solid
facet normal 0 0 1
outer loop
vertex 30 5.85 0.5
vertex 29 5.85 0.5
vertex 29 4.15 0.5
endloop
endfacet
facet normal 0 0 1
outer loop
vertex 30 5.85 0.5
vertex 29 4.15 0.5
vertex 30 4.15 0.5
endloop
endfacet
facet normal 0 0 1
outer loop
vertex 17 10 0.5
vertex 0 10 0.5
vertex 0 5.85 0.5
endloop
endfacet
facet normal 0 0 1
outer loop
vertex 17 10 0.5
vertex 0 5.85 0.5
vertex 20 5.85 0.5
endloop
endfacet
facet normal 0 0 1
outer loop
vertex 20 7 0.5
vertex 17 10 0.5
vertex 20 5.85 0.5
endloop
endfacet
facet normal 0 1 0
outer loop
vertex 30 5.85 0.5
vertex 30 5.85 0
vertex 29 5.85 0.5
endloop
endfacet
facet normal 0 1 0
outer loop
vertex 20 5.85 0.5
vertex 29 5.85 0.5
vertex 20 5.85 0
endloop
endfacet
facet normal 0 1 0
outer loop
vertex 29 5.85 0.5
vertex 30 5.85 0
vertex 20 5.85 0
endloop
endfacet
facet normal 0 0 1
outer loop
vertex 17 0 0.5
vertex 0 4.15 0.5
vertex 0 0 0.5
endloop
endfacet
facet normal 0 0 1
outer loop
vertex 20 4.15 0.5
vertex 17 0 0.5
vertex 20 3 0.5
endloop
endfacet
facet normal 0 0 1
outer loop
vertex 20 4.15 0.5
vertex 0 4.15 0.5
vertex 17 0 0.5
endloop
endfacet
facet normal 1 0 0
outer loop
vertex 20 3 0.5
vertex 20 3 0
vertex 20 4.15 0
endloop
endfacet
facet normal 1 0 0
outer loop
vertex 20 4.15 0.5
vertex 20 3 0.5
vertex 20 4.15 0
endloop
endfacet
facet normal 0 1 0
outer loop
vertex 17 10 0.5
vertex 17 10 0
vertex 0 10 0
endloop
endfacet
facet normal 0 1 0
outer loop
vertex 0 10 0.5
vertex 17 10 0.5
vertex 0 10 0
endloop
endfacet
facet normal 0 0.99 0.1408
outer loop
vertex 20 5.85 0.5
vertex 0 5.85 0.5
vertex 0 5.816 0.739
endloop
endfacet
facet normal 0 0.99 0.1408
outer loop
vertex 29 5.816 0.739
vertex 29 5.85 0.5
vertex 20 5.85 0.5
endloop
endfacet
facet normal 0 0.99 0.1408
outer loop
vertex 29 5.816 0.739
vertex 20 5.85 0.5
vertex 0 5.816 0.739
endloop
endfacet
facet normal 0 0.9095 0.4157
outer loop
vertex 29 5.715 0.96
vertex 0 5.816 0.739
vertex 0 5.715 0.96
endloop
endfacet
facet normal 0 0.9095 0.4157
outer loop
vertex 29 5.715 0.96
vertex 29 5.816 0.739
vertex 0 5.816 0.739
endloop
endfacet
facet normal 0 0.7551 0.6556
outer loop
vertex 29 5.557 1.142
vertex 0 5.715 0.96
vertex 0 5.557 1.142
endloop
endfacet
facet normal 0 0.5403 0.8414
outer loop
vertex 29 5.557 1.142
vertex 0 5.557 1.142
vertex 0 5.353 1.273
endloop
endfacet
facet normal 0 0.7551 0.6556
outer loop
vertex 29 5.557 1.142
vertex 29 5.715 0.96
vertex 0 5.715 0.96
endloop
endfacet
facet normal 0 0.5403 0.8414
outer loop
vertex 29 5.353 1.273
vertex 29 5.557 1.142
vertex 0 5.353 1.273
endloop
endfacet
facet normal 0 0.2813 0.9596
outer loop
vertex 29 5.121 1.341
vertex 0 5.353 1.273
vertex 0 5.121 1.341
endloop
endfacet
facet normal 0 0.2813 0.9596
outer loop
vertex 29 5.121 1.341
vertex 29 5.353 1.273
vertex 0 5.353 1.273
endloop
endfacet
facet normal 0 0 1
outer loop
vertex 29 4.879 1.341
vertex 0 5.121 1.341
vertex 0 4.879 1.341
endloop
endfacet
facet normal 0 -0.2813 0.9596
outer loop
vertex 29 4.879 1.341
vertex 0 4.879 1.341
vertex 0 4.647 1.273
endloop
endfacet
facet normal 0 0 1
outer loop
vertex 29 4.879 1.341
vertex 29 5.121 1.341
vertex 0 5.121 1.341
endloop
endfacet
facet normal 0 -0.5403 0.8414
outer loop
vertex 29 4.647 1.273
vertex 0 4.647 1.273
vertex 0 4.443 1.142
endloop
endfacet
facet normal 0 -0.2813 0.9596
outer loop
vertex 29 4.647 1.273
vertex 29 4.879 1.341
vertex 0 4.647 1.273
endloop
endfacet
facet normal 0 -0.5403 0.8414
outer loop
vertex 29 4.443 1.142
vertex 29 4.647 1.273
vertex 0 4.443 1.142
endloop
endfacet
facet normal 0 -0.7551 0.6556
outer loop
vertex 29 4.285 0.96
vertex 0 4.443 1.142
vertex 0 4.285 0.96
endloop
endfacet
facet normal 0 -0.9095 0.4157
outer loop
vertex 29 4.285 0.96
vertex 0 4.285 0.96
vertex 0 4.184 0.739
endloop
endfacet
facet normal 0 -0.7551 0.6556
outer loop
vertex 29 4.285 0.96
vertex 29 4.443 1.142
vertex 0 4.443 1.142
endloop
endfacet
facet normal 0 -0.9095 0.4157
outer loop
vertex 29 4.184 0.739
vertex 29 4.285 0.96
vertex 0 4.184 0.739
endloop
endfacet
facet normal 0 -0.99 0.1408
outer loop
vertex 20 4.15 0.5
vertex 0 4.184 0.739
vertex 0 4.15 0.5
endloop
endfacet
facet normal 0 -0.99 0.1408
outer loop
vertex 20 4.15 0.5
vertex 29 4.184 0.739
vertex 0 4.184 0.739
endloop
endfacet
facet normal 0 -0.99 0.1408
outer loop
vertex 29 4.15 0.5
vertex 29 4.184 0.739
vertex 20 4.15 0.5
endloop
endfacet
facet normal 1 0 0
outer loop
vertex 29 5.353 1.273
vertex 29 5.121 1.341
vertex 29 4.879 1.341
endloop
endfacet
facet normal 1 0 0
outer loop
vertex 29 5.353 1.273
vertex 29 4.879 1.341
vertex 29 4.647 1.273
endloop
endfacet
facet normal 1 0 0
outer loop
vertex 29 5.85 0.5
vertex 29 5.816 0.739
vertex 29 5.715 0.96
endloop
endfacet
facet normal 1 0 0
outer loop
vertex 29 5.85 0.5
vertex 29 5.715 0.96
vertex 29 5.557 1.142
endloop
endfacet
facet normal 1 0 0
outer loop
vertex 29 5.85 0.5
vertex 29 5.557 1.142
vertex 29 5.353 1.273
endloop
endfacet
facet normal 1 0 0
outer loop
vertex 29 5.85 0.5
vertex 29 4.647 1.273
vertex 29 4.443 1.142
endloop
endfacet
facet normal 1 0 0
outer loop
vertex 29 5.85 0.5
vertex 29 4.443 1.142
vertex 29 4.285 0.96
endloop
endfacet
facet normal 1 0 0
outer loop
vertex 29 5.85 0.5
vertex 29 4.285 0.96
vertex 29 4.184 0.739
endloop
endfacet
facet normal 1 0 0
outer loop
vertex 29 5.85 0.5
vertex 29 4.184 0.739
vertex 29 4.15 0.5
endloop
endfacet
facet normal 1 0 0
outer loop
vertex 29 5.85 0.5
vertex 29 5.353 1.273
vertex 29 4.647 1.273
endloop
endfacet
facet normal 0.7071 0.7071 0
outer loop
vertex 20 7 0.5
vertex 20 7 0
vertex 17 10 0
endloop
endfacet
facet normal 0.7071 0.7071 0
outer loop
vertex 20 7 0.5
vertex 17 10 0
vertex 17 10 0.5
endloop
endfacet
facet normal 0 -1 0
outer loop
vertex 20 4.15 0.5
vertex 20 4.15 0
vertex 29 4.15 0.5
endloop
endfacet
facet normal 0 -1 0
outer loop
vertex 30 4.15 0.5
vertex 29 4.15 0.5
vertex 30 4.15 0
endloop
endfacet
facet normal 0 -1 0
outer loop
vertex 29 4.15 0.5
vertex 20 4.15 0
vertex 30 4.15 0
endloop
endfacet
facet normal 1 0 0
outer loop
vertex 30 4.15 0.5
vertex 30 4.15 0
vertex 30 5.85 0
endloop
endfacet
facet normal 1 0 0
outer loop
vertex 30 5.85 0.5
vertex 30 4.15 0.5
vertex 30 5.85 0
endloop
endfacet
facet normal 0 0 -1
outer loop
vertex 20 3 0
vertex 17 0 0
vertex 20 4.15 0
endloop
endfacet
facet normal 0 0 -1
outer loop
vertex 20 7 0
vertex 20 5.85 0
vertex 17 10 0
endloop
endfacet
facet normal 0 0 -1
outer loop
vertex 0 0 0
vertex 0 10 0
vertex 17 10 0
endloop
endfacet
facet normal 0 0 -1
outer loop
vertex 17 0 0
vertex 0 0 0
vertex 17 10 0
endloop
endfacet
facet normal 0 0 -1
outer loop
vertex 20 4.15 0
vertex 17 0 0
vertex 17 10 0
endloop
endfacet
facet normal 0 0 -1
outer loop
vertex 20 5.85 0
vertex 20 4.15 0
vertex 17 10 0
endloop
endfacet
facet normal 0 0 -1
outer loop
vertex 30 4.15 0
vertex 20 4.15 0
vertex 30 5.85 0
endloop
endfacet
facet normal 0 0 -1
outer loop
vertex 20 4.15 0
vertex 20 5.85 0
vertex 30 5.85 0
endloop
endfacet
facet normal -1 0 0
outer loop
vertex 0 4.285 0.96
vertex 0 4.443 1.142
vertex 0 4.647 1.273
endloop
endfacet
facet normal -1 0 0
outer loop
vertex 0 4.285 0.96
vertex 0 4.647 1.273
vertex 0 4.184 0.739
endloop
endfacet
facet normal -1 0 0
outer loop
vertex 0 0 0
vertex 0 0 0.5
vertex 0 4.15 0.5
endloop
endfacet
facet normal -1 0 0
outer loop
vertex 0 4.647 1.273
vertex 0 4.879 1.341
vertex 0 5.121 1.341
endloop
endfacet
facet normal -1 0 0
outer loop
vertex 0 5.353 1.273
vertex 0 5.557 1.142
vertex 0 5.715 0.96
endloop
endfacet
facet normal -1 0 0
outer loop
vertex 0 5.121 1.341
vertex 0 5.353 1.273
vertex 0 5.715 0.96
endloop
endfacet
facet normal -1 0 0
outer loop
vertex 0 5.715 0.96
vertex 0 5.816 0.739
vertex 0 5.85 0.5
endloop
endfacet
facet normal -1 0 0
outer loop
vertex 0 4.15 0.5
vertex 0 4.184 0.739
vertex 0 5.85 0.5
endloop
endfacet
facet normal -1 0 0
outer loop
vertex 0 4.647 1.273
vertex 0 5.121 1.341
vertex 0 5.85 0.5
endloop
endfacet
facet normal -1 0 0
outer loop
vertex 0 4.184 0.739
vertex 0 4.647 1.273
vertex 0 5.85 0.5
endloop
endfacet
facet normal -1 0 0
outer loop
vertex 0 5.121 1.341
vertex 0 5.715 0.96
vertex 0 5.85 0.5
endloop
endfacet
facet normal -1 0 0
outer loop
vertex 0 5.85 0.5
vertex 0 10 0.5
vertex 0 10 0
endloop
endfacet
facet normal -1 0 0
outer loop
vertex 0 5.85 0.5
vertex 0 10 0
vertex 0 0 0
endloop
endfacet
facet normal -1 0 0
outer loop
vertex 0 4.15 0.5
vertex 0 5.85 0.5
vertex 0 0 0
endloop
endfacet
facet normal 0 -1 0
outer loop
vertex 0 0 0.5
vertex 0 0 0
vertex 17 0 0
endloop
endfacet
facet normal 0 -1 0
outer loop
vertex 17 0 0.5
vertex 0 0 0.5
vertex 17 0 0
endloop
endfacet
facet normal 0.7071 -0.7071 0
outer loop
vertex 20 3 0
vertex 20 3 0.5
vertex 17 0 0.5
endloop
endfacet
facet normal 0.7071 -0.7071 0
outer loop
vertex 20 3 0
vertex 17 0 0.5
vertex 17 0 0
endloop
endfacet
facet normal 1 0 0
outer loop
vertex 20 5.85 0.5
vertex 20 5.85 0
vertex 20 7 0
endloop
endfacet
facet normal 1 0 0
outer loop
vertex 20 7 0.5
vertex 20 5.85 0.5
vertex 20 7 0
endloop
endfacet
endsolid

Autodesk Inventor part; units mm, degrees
ref_plane "YZ Plane" through (0, 0, 0) normal (1, 0, 0) x (0, 1, 0)
ref_plane "XZ Plane" through (0, 0, 0) normal (0, 1, 0) x (-1, 0, 0)
sketch "Sketch5" plane through (0, 0, 0) normal (0, 0, 1) x (1, 0, 0)
  line L0 (0, 0) -> (20, 0)
  line L1 (20, 0) -> (20, 10)
  line L2 (20, 10) -> (0, 10)
  line L3 (0, 10) -> (0, 0)
  line L4 (20, 4.15) -> (30, 4.15)
  line L5 (30, 4.15) -> (30, 5.85)
  line L6 (30, 5.85) -> (20, 5.85)
  line L7 (20, 5.85) -> (20, 4.15)
  point P0 (20, 5)
  point P1 (20, 5)
  dimension "d11" = 10
  dimension "d12" = 1.7
  dimension "d13" = 20
  dimension "d14" = 10
extrude "Extrusion3" add sketch "Sketch5" along normal blind 0.5
chamfer "Chamfer1" distance 3 angle 45 2 edges at (20, 10, 0.25) (20, 0, 0.25)
ref_plane "Work Plane1" through (29, 4.15, 0) normal (1, 0, 0) x (0, 0, -1)
sketch "Sketch6" plane through (29, 4.15, 0) normal (1, 0, 0) x (0, 0, -1)
  line L0 (0, 1.7) -> (0, 0) projected
  line L1 (0, 0) -> (-0.5, 0) projected
  line L2 (-0.5, 0) -> (-0.5, 1.7) projected
  line L3 (-0.5, 1.7) -> (0, 1.7) projected
  arc A0 (-0.5, 1.7) -> (-0.5, 0) centre (-0.5, 0.85) ccw
  point P0 (0, -4.15)
extrude "Extrusion4" add sketch "Sketch6" against normal up to surface (29 mm away) contours L2 A0
properties part number "current-adjusting-screwdriver"
